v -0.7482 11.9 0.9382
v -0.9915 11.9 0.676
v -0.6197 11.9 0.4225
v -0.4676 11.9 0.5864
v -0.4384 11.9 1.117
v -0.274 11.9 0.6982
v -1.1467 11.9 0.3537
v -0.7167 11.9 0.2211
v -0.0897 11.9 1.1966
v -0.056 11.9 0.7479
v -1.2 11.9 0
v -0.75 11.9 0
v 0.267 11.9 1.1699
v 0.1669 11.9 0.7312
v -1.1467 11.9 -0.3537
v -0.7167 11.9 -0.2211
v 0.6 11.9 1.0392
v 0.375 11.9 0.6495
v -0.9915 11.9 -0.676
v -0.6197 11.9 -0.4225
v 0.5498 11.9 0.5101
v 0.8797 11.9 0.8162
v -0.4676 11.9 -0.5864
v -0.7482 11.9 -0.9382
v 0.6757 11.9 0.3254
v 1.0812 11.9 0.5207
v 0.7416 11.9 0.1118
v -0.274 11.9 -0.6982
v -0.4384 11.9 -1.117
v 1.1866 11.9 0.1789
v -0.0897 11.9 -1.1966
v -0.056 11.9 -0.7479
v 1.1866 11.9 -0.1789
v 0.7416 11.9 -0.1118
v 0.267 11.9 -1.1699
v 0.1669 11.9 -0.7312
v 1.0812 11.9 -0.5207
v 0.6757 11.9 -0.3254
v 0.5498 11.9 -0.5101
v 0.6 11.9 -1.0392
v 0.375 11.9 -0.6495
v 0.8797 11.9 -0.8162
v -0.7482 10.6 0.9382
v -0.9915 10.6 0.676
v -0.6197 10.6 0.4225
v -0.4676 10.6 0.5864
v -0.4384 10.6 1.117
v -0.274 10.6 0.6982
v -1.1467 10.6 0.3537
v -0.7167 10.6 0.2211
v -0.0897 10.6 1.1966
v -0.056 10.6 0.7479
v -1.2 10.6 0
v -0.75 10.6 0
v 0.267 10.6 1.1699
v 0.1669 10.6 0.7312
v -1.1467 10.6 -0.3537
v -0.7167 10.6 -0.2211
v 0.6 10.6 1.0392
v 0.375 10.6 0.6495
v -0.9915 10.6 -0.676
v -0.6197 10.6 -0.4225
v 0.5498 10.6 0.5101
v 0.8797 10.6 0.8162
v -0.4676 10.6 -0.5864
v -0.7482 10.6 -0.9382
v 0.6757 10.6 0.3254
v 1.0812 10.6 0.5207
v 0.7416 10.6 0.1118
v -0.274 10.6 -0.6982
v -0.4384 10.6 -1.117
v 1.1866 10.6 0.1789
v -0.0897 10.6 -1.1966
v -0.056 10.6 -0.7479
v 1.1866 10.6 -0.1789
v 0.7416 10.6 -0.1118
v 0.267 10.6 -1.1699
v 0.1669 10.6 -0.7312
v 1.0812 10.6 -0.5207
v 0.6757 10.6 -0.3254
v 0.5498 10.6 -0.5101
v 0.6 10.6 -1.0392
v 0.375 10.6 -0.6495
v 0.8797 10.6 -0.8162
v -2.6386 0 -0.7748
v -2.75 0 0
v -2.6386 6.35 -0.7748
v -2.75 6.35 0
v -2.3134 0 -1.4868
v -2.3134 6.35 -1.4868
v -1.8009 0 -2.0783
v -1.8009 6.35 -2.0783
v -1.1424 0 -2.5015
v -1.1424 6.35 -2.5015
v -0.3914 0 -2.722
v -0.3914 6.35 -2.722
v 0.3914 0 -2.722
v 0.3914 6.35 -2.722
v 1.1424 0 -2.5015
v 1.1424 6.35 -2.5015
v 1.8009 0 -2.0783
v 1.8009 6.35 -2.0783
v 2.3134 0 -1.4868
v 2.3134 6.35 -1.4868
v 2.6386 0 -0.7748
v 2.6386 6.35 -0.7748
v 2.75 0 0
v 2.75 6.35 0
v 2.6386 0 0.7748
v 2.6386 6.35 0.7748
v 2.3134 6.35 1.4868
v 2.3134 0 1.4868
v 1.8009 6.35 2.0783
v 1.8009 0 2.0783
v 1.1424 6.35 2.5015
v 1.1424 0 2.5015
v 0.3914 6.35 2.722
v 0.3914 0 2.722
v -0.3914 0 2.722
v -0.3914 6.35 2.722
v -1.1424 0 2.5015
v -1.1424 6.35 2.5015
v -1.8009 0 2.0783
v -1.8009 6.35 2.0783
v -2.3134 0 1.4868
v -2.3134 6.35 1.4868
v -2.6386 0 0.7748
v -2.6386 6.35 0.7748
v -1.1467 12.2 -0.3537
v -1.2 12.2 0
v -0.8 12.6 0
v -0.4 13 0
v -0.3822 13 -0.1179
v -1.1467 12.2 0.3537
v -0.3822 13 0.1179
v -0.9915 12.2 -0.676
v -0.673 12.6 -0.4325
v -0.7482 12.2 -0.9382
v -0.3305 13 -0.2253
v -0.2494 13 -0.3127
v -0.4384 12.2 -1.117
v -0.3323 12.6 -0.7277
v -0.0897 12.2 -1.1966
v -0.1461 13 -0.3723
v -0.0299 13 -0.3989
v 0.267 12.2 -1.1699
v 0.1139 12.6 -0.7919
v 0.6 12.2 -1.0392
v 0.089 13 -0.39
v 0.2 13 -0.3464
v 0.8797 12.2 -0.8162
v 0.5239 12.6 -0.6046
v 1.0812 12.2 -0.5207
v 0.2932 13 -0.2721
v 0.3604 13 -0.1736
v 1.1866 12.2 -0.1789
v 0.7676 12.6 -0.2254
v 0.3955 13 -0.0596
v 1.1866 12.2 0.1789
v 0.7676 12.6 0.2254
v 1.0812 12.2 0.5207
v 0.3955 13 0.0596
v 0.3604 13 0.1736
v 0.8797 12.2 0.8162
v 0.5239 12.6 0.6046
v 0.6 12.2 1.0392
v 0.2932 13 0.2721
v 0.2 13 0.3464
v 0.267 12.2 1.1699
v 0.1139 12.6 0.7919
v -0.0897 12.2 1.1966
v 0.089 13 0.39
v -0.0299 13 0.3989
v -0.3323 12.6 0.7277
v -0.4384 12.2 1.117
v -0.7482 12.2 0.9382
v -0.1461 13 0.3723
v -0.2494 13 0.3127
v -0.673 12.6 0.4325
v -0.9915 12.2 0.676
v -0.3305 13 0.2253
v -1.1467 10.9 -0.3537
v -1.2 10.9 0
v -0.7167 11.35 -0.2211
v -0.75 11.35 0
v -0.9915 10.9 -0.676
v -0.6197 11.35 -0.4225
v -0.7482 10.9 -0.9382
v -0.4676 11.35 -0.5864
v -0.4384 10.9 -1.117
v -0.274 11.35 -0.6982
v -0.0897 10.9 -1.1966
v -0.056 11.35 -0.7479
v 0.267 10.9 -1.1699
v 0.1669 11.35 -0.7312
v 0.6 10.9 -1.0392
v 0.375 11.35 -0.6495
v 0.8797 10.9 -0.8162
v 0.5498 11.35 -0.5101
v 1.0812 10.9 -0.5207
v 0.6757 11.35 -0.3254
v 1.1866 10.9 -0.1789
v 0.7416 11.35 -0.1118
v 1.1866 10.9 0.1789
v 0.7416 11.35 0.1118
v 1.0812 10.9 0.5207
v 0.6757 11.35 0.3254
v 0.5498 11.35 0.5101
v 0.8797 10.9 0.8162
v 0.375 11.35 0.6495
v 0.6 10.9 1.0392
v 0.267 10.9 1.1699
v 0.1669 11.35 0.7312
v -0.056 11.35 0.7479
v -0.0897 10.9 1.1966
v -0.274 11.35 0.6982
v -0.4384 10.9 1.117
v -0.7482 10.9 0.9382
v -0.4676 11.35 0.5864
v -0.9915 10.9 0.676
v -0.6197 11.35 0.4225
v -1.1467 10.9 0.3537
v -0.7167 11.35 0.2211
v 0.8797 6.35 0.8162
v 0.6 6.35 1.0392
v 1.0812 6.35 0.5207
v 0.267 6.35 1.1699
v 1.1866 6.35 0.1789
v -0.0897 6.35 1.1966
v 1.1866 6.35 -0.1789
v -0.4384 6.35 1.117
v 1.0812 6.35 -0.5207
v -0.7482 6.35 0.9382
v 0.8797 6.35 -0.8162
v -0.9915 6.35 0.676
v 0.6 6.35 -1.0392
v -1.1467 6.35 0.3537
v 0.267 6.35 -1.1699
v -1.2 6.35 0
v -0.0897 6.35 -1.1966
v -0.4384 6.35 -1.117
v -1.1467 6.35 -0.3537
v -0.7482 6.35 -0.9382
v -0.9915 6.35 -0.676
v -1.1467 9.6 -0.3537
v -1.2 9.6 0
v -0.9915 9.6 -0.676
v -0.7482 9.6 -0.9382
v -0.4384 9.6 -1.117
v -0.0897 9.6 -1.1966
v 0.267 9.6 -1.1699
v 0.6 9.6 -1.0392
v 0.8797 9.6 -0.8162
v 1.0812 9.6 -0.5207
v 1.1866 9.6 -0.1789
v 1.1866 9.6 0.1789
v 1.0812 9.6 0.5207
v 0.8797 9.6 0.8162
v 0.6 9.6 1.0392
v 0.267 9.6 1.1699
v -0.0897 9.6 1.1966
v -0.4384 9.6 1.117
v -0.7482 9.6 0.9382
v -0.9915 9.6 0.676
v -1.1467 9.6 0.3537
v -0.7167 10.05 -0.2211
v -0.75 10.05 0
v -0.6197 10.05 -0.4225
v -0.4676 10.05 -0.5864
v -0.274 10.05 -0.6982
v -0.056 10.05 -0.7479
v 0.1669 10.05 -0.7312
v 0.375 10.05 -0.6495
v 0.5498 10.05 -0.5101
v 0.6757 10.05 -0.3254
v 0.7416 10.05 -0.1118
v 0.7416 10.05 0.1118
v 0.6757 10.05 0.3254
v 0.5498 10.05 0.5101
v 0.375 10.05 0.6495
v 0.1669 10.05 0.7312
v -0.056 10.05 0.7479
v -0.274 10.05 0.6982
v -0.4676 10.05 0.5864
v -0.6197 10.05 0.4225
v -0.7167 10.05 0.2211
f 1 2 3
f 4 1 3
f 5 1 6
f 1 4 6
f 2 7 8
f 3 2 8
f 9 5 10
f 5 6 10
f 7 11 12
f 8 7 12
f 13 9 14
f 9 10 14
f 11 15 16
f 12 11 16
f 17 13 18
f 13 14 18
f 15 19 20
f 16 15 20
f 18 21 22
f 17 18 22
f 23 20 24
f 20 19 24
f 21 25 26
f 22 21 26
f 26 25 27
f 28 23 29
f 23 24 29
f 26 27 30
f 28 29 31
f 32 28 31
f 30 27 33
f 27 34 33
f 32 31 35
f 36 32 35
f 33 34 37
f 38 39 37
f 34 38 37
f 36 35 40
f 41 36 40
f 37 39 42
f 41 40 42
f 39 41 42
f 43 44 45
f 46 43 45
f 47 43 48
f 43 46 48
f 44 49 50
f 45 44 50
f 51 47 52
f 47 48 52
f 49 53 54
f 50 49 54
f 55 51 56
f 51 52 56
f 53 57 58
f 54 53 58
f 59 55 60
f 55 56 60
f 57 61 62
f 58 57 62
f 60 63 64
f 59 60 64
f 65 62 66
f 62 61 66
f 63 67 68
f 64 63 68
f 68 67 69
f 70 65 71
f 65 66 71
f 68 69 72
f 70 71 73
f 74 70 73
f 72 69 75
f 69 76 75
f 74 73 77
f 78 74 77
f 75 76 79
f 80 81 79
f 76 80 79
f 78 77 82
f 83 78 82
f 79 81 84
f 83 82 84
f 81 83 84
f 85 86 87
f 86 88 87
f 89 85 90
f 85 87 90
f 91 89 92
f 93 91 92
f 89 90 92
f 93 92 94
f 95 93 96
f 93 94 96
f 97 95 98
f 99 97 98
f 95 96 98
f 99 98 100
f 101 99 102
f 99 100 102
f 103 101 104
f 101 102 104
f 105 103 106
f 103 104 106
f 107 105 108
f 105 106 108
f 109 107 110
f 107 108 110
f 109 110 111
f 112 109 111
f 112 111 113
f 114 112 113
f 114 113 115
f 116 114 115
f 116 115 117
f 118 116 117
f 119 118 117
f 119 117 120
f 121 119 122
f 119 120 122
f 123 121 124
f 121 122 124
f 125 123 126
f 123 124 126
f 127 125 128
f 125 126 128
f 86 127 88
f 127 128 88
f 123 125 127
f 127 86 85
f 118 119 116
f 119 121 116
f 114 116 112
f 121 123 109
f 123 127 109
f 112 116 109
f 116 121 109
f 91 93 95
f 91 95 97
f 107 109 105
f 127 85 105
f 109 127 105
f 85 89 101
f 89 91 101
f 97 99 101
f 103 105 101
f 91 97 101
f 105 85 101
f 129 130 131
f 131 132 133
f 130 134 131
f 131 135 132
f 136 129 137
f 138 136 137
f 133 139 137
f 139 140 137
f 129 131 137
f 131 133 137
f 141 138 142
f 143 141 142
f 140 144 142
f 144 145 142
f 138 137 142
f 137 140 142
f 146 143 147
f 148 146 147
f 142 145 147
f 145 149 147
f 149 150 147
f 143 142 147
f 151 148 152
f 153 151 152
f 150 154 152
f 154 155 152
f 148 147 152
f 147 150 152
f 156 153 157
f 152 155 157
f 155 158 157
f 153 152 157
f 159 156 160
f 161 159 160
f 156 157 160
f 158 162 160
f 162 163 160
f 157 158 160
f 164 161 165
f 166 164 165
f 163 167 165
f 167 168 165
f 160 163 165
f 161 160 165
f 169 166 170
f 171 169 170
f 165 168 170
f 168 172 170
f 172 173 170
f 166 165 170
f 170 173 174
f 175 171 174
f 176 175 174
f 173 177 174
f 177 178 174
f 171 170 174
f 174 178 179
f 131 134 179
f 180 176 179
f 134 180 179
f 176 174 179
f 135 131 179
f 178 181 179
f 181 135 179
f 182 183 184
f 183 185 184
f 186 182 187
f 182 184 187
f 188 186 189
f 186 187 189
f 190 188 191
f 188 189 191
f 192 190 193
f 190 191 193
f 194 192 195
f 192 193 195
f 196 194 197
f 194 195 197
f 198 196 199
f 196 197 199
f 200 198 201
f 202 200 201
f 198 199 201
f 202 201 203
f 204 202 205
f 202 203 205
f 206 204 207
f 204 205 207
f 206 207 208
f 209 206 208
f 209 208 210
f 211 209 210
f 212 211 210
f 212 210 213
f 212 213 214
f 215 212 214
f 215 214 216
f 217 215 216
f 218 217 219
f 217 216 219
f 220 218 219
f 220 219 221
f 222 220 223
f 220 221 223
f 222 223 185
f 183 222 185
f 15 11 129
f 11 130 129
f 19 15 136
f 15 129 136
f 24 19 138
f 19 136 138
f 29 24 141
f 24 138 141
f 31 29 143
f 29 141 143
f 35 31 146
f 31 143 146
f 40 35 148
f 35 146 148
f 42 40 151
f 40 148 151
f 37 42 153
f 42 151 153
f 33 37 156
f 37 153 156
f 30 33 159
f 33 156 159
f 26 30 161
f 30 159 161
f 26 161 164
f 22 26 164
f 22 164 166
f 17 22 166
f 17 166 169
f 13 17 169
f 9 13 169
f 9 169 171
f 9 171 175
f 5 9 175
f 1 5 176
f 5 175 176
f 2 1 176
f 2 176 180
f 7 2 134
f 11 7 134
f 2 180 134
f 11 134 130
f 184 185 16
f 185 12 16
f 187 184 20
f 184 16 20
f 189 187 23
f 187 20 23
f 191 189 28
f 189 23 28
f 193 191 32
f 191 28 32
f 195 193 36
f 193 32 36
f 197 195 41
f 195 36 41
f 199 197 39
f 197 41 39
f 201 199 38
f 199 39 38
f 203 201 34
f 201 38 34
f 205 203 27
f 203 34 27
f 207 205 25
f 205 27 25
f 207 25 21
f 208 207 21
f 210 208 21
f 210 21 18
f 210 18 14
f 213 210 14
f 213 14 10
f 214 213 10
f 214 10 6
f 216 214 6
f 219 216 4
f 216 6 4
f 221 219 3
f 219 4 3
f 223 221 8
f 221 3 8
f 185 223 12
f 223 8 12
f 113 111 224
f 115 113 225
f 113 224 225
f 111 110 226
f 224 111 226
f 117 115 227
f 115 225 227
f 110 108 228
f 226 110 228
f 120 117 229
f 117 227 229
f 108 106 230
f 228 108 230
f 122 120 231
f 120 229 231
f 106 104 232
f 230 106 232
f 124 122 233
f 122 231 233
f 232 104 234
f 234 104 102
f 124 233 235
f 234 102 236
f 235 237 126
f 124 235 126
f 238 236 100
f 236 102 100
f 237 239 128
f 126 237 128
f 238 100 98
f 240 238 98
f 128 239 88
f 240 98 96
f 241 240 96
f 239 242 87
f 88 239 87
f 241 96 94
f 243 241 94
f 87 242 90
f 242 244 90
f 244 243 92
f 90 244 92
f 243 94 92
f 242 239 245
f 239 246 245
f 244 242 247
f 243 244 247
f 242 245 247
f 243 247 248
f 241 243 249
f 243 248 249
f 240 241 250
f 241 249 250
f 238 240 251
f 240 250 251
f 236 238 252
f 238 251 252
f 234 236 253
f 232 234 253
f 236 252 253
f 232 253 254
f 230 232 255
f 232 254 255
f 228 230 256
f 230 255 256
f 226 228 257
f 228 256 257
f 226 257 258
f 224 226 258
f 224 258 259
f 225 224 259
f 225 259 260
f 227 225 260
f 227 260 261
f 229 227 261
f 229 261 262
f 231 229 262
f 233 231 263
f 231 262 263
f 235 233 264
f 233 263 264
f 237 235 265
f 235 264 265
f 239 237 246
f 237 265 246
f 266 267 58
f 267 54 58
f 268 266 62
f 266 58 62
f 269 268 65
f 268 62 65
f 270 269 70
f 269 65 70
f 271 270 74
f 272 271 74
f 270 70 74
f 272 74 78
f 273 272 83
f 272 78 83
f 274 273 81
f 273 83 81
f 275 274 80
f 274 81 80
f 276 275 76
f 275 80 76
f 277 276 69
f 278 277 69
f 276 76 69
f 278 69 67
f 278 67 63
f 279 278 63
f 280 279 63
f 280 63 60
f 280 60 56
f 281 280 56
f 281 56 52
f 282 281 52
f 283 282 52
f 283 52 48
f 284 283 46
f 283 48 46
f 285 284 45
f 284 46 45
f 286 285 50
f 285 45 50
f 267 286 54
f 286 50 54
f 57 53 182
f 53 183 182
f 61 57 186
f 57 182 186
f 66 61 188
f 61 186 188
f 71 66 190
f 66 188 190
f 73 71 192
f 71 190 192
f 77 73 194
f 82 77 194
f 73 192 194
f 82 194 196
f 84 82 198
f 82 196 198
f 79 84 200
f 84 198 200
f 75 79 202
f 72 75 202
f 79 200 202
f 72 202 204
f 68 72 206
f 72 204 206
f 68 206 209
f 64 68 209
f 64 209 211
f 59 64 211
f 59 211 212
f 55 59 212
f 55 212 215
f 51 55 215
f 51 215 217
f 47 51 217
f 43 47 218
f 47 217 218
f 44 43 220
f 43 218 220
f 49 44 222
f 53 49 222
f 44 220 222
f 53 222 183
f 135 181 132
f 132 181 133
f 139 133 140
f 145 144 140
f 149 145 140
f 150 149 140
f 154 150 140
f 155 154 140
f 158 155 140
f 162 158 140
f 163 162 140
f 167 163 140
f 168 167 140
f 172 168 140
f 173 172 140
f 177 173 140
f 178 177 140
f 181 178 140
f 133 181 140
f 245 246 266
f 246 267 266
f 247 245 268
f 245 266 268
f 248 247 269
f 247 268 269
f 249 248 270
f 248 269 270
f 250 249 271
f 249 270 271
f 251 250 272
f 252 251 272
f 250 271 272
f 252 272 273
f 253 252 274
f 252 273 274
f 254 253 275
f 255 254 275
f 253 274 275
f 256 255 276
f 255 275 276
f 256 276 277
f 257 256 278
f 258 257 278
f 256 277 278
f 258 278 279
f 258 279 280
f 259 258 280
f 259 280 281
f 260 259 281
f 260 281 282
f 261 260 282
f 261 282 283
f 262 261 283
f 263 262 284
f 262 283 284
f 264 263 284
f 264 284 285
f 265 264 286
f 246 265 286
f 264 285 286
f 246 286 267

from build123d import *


with BuildPart() as part:
    # Sketch1 → Revolve1 (revolve)
    with BuildSketch(Plane.XY, mode=Mode.PRIVATE) as revolve1_sk:
        Polygon((2.75, 6.35), (1.2, 6.35), (1.2, 9.6), (0.75, 10.05), (0.75, 10.6), (1.2, 10.6), (1.2, 10.9), (0.75, 11.35), (0.75, 11.9), (1.2, 11.9), (1.2, 12.2), (0.4, 13), (0, 13), (0, 0), (2.75, 0), align=None)
    revolve(revolve1_sk.sketch.rotate(Axis((0, 0, 0), (0, -1, 0)), 180), axis=Axis((0, 0, 0), (0, -1, 0)))  # turned: the seam where the file's is


solid = part.part
